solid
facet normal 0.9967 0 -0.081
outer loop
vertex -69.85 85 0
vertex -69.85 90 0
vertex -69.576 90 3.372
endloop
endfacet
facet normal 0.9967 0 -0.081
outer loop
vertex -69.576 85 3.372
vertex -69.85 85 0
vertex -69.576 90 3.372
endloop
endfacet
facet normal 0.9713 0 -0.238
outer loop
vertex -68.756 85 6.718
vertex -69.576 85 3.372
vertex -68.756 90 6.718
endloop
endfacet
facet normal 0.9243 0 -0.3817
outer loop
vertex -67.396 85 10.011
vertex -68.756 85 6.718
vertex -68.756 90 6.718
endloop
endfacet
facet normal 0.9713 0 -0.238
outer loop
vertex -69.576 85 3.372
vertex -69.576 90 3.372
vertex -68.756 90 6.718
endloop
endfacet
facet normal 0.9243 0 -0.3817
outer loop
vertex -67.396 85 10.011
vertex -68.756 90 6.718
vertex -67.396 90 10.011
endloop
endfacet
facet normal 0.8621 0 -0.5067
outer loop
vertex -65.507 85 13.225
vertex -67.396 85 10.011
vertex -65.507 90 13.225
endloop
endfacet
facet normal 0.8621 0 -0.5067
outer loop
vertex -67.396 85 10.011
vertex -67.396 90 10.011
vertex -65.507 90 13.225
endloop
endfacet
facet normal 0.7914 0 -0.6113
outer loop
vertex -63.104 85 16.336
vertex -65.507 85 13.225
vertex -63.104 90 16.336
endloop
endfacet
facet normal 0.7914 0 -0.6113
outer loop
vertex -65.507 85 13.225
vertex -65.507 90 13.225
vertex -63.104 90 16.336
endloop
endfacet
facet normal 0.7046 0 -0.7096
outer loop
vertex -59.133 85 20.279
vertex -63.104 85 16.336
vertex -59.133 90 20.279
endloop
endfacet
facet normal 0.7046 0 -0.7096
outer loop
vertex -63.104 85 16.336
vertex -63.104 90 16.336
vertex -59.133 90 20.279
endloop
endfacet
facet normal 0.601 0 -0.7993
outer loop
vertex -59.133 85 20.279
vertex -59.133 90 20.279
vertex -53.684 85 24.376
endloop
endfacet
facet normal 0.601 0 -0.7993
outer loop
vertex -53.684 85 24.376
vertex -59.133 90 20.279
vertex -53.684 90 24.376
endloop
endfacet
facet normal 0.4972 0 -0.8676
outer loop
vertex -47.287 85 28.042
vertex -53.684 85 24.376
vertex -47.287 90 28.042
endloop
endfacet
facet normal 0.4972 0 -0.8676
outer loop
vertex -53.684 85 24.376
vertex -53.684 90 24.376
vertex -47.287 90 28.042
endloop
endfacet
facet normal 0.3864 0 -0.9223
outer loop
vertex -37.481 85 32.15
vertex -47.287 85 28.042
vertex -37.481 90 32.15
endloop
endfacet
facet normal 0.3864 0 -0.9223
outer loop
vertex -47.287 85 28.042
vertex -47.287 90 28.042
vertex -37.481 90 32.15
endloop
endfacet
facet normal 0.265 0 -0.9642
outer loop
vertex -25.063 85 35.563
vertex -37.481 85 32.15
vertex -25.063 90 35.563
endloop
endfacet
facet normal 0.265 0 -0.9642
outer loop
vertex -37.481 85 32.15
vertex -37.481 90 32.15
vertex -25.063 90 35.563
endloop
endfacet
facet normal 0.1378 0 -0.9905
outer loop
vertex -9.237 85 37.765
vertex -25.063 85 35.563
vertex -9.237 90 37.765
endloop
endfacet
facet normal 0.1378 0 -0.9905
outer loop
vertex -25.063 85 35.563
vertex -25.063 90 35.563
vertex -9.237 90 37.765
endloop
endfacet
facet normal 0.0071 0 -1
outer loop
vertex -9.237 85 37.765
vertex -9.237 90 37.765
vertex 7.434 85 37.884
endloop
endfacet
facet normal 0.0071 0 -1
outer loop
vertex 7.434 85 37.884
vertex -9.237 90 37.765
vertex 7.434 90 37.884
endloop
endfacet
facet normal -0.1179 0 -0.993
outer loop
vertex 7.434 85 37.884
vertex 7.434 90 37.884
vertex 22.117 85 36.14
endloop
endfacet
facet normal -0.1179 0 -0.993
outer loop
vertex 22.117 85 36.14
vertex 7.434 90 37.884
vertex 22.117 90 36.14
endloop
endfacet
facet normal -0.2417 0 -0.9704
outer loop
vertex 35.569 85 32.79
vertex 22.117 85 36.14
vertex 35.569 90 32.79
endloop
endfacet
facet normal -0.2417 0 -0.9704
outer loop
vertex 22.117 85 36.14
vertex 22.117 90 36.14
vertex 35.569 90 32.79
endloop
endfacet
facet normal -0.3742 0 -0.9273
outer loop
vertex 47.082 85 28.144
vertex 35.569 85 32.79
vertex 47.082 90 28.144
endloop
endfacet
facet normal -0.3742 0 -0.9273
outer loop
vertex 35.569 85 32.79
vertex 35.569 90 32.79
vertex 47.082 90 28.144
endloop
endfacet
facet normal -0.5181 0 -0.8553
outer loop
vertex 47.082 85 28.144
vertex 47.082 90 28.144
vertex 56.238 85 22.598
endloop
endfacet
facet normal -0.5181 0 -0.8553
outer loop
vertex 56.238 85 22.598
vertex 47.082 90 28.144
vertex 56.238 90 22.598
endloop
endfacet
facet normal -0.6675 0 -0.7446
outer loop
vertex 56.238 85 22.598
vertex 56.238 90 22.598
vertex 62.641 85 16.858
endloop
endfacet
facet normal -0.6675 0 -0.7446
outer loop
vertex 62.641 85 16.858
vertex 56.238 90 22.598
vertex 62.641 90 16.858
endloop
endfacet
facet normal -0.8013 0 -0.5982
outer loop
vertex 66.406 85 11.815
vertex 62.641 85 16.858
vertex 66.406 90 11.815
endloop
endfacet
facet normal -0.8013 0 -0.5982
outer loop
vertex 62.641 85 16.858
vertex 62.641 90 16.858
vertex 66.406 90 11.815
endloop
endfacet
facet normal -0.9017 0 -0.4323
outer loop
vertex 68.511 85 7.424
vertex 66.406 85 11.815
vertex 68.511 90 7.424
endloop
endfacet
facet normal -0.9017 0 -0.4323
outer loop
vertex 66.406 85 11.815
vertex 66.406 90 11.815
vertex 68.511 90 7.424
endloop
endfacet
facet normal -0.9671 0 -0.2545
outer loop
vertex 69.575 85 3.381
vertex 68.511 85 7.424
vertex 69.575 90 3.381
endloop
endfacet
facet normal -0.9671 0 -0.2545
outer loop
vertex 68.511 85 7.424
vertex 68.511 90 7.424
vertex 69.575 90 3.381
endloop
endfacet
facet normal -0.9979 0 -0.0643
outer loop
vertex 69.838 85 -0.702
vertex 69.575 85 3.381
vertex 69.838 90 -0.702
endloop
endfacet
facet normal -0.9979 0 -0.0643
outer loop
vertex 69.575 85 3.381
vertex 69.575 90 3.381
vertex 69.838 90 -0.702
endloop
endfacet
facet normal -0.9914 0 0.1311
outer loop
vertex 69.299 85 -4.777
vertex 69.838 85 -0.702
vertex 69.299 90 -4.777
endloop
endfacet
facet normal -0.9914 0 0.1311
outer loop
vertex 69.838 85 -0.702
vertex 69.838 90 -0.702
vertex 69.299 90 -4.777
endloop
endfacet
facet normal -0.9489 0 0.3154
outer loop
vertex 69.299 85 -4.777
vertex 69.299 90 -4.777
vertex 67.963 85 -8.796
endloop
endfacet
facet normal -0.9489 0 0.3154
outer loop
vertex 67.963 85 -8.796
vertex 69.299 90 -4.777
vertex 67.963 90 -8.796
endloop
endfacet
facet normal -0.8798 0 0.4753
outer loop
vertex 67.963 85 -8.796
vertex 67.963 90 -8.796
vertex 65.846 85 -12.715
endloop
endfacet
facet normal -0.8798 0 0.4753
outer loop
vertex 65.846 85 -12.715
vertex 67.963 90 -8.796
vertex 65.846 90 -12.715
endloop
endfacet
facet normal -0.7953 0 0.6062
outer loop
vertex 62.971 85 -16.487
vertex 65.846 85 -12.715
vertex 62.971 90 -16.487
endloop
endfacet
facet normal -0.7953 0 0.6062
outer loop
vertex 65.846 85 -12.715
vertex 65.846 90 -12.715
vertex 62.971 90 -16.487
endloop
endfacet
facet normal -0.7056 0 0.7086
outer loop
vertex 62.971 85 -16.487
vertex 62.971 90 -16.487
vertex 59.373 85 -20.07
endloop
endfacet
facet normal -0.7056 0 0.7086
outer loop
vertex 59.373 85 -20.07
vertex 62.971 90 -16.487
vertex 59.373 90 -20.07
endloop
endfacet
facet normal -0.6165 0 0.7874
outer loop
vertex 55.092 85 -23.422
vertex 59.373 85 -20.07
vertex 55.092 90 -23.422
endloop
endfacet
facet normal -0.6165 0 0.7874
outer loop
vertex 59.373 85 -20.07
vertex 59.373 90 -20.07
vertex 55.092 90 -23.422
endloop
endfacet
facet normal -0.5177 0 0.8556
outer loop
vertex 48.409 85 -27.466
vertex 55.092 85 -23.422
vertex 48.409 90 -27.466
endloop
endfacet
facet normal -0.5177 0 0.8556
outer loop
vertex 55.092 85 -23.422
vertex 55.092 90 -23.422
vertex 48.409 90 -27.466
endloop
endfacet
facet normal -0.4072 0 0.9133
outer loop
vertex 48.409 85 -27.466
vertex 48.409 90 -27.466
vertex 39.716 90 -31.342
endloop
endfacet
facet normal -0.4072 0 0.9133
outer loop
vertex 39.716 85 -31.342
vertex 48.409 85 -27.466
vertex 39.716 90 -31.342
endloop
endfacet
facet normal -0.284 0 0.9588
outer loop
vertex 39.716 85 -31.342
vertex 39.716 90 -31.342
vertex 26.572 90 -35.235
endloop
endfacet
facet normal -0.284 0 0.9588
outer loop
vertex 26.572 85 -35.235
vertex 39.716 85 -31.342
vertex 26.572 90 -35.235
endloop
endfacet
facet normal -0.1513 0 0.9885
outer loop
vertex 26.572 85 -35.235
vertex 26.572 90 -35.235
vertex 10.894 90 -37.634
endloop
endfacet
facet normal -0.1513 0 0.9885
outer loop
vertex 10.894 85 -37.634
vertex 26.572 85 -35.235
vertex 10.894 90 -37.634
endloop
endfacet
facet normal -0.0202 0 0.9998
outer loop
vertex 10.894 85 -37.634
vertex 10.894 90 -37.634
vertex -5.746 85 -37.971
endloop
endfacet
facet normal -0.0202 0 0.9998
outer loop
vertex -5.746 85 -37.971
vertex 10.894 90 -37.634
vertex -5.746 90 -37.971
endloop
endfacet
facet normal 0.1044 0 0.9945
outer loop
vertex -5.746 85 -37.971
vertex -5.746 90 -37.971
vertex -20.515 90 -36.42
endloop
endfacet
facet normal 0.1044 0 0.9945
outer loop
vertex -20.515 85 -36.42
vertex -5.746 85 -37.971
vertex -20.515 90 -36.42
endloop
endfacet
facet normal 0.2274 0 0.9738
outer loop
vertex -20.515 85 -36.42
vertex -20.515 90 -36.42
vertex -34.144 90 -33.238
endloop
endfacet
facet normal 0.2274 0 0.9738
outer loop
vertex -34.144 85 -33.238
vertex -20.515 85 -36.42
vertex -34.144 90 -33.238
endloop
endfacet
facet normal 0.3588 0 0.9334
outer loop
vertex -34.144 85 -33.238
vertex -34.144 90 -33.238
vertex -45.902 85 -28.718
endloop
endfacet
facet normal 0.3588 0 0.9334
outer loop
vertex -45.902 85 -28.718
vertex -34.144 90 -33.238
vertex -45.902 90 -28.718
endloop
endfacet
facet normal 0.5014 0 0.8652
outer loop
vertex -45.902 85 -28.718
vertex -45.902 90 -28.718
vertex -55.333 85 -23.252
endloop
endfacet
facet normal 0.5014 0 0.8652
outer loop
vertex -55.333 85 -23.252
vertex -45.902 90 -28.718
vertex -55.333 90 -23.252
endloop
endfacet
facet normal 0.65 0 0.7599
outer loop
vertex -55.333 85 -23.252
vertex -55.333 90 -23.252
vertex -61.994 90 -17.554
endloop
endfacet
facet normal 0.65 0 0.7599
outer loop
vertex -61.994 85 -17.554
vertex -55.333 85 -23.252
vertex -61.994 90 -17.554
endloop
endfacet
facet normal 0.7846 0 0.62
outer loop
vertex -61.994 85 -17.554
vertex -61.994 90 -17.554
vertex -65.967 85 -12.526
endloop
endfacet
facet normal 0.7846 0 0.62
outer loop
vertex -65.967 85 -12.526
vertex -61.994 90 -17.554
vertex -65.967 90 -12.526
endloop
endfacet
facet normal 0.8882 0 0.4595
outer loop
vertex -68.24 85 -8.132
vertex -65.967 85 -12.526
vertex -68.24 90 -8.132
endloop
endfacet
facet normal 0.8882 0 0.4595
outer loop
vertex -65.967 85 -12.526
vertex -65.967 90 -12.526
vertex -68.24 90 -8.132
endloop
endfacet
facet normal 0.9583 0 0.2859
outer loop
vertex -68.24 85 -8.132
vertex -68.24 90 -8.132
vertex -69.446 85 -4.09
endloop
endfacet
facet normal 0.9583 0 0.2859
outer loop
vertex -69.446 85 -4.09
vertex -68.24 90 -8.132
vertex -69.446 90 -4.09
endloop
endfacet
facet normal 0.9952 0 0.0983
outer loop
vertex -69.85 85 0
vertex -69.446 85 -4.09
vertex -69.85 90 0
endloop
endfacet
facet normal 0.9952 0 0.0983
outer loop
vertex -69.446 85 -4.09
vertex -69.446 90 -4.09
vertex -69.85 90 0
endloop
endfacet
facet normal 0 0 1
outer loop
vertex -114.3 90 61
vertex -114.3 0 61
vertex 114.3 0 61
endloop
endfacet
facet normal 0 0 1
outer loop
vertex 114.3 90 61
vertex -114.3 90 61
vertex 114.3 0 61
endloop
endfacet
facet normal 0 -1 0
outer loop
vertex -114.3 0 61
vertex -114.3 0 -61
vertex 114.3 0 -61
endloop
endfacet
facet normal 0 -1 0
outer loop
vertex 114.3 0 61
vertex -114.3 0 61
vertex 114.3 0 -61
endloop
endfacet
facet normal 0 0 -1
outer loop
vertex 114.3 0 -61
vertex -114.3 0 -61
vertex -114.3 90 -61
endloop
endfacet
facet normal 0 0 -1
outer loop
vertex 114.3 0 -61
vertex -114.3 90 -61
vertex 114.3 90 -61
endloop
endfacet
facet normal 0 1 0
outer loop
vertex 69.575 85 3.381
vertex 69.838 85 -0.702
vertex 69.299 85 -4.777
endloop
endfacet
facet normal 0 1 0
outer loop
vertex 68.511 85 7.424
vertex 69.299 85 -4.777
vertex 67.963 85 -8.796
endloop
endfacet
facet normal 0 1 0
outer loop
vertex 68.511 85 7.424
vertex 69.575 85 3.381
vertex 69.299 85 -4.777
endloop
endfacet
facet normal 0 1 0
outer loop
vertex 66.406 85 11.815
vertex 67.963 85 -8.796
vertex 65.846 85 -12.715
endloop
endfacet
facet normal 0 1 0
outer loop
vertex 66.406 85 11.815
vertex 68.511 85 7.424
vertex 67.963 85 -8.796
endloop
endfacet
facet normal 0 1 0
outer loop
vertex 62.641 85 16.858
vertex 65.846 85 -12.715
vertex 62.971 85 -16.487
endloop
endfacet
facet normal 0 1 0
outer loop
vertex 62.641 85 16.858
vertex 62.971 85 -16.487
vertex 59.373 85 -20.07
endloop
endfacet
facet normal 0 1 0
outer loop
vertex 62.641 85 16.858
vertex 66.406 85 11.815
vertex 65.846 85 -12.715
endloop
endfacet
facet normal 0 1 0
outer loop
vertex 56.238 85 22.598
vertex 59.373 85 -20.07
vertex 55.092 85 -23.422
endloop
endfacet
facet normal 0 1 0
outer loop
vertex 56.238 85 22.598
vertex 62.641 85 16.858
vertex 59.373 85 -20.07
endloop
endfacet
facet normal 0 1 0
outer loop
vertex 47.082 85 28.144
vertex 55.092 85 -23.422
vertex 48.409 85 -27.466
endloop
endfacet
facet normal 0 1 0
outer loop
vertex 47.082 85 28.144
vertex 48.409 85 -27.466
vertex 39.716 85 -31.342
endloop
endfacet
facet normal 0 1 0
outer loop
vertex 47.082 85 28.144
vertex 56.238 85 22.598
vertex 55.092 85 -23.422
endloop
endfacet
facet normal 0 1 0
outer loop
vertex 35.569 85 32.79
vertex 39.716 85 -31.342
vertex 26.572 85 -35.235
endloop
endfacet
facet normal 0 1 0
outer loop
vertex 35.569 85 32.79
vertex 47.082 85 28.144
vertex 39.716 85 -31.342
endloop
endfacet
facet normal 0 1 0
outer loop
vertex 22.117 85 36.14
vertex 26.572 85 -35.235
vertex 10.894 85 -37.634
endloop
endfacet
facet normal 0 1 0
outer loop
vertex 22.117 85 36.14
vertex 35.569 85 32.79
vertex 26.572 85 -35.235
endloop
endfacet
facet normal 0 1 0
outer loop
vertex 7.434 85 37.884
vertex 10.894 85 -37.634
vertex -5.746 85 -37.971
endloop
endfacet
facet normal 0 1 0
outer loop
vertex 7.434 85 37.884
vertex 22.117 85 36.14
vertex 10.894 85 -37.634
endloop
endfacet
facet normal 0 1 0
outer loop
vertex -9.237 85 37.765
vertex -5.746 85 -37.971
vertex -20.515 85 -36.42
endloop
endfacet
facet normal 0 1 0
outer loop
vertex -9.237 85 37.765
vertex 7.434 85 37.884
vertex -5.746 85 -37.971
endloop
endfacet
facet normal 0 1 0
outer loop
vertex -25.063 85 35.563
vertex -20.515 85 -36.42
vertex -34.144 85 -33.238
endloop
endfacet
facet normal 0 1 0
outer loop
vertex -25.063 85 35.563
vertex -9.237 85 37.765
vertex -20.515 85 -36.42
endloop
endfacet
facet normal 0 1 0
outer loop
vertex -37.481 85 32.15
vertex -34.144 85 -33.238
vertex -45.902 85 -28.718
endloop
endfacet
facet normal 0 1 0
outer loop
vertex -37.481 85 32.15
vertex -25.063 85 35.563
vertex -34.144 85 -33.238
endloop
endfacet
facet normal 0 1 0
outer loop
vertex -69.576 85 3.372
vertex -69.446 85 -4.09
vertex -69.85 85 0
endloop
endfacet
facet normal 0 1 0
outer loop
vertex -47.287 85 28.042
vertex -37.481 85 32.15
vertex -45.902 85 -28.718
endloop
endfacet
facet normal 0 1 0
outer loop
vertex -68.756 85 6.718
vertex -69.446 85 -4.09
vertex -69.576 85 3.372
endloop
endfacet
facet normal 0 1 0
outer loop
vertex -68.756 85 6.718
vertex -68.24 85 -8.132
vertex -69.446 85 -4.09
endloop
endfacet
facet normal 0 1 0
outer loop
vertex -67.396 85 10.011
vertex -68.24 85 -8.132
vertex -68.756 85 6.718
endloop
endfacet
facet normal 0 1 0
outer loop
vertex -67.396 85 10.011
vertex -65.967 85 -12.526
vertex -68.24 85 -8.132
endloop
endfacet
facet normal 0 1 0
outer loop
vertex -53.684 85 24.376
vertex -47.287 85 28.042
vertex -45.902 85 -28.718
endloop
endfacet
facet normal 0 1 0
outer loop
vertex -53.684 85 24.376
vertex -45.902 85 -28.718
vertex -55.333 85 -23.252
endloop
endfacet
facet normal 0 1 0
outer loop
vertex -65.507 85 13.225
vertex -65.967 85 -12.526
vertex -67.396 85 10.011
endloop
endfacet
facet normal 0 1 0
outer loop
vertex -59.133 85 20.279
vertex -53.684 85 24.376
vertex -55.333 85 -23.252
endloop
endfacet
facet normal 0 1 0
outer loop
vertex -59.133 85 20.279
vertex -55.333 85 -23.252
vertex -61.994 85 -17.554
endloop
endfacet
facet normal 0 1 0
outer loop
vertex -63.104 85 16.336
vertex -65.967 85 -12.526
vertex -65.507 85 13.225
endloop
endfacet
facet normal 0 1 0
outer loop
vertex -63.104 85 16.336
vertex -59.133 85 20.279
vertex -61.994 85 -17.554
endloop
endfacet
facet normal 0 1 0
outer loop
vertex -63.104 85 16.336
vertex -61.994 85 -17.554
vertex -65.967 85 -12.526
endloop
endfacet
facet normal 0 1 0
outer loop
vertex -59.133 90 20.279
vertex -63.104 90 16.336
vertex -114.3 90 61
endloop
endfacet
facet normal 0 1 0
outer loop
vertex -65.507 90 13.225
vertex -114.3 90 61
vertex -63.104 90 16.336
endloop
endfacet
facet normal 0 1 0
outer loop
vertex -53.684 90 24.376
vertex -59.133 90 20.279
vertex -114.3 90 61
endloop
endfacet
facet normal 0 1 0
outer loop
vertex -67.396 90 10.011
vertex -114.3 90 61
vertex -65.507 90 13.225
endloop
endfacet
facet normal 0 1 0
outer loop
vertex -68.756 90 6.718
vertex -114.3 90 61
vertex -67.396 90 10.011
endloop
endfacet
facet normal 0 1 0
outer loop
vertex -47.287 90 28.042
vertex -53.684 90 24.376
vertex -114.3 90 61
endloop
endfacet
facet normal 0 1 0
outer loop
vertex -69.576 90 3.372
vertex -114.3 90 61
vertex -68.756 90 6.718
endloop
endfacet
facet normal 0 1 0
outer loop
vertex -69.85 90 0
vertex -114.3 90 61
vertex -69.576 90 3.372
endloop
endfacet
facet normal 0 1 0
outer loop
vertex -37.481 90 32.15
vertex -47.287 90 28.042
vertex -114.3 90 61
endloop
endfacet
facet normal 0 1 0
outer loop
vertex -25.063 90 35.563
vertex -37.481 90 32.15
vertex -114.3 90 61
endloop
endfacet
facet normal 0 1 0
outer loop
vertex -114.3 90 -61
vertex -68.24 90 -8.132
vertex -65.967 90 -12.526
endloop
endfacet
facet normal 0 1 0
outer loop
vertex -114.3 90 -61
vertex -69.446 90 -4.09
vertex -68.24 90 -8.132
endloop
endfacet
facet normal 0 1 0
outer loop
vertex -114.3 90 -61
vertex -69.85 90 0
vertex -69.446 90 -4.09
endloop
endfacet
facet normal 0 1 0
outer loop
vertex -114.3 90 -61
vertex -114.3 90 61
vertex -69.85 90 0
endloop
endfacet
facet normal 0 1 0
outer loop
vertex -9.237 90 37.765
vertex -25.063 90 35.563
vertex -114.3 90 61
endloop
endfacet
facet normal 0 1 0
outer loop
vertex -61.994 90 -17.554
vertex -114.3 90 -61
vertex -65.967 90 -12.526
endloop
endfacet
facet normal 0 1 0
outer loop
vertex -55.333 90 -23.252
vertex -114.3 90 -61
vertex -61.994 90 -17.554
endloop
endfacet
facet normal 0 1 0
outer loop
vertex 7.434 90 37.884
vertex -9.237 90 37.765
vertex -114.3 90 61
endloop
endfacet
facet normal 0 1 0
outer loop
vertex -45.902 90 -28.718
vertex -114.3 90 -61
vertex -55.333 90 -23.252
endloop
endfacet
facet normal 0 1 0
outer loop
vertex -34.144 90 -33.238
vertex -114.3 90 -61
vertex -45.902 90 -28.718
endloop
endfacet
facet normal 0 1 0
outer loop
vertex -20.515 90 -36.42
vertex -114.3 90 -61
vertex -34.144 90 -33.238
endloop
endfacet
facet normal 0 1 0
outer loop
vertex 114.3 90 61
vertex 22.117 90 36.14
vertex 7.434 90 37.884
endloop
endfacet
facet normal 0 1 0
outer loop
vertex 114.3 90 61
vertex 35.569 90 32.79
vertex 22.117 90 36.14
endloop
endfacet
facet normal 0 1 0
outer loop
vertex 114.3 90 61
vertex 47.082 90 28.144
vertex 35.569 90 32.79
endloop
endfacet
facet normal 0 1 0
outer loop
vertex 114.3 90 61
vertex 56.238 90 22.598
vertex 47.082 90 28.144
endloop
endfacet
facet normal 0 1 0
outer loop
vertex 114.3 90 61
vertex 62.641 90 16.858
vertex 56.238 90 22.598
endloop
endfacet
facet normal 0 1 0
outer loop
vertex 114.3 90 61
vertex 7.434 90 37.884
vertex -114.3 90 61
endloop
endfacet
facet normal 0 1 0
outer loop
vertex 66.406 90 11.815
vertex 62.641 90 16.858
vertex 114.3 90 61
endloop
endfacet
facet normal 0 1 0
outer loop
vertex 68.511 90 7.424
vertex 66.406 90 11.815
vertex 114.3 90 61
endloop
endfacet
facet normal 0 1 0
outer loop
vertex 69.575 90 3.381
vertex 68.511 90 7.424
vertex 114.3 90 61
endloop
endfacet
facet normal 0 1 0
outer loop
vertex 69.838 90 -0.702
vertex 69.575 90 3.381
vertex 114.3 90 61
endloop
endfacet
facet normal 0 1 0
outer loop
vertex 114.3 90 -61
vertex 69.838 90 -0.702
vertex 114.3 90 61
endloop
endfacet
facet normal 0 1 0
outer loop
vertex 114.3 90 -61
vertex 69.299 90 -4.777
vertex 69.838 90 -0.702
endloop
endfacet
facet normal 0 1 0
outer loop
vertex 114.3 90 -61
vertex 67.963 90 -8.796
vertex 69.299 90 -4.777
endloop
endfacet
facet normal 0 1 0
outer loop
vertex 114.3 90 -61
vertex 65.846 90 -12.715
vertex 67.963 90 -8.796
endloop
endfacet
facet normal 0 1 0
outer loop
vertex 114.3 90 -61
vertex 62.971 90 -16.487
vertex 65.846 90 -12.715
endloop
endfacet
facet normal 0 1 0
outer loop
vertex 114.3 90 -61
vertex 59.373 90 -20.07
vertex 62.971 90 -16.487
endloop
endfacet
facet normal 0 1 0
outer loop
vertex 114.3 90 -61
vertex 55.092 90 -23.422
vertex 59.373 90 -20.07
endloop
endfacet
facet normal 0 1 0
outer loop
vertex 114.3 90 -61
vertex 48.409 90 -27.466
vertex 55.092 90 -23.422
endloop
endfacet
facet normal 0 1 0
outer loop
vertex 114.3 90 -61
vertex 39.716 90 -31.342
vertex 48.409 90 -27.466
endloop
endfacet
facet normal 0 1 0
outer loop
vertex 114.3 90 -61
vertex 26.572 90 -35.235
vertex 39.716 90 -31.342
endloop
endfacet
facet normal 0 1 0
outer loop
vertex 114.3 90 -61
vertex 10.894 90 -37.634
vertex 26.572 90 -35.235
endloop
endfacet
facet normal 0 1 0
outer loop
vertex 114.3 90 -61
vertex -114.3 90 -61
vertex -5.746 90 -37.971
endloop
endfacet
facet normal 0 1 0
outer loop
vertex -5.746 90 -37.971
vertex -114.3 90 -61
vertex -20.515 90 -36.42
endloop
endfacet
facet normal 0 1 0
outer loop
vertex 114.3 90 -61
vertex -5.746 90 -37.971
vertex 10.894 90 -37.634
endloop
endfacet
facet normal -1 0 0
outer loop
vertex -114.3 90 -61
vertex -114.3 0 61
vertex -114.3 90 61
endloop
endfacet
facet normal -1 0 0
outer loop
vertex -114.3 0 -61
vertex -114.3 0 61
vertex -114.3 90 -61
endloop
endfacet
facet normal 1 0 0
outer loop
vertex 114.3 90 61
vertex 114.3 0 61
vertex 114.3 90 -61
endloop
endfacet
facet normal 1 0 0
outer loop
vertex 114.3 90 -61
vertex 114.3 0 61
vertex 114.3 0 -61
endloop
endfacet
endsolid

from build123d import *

# Parameters (mm, degrees)
SKETCH1_W           = 228.6
SKETCH1_H           = 122
BOSS_EXTRUDE1_DEPTH = 90
SKETCH2_RX          = 69.85
SKETCH2_RY          = 38.1
CUT_EXTRUDE1_DEPTH  = 5


with BuildPart() as part:
    # Sketch1 → Boss-Extrude1 (new body)
    with BuildSketch(Plane(origin=(0, 0, 0), x_dir=(1, 0, 0), z_dir=(0, 1, 0))):
        Rectangle(SKETCH1_W, SKETCH1_H)
    extrude(amount=BOSS_EXTRUDE1_DEPTH)

    # Sketch2 → Cut-Extrude1 (cut)
    with BuildSketch(Plane(origin=(0, 90, 0), x_dir=(1, 0, 0), z_dir=(0, 1, 0))):
        with Locations(Location((0, 0), (0, 0, 180))):
            Ellipse(SKETCH2_RX, SKETCH2_RY)
    extrude(amount=-CUT_EXTRUDE1_DEPTH, mode=Mode.SUBTRACT)


solid = part.part
